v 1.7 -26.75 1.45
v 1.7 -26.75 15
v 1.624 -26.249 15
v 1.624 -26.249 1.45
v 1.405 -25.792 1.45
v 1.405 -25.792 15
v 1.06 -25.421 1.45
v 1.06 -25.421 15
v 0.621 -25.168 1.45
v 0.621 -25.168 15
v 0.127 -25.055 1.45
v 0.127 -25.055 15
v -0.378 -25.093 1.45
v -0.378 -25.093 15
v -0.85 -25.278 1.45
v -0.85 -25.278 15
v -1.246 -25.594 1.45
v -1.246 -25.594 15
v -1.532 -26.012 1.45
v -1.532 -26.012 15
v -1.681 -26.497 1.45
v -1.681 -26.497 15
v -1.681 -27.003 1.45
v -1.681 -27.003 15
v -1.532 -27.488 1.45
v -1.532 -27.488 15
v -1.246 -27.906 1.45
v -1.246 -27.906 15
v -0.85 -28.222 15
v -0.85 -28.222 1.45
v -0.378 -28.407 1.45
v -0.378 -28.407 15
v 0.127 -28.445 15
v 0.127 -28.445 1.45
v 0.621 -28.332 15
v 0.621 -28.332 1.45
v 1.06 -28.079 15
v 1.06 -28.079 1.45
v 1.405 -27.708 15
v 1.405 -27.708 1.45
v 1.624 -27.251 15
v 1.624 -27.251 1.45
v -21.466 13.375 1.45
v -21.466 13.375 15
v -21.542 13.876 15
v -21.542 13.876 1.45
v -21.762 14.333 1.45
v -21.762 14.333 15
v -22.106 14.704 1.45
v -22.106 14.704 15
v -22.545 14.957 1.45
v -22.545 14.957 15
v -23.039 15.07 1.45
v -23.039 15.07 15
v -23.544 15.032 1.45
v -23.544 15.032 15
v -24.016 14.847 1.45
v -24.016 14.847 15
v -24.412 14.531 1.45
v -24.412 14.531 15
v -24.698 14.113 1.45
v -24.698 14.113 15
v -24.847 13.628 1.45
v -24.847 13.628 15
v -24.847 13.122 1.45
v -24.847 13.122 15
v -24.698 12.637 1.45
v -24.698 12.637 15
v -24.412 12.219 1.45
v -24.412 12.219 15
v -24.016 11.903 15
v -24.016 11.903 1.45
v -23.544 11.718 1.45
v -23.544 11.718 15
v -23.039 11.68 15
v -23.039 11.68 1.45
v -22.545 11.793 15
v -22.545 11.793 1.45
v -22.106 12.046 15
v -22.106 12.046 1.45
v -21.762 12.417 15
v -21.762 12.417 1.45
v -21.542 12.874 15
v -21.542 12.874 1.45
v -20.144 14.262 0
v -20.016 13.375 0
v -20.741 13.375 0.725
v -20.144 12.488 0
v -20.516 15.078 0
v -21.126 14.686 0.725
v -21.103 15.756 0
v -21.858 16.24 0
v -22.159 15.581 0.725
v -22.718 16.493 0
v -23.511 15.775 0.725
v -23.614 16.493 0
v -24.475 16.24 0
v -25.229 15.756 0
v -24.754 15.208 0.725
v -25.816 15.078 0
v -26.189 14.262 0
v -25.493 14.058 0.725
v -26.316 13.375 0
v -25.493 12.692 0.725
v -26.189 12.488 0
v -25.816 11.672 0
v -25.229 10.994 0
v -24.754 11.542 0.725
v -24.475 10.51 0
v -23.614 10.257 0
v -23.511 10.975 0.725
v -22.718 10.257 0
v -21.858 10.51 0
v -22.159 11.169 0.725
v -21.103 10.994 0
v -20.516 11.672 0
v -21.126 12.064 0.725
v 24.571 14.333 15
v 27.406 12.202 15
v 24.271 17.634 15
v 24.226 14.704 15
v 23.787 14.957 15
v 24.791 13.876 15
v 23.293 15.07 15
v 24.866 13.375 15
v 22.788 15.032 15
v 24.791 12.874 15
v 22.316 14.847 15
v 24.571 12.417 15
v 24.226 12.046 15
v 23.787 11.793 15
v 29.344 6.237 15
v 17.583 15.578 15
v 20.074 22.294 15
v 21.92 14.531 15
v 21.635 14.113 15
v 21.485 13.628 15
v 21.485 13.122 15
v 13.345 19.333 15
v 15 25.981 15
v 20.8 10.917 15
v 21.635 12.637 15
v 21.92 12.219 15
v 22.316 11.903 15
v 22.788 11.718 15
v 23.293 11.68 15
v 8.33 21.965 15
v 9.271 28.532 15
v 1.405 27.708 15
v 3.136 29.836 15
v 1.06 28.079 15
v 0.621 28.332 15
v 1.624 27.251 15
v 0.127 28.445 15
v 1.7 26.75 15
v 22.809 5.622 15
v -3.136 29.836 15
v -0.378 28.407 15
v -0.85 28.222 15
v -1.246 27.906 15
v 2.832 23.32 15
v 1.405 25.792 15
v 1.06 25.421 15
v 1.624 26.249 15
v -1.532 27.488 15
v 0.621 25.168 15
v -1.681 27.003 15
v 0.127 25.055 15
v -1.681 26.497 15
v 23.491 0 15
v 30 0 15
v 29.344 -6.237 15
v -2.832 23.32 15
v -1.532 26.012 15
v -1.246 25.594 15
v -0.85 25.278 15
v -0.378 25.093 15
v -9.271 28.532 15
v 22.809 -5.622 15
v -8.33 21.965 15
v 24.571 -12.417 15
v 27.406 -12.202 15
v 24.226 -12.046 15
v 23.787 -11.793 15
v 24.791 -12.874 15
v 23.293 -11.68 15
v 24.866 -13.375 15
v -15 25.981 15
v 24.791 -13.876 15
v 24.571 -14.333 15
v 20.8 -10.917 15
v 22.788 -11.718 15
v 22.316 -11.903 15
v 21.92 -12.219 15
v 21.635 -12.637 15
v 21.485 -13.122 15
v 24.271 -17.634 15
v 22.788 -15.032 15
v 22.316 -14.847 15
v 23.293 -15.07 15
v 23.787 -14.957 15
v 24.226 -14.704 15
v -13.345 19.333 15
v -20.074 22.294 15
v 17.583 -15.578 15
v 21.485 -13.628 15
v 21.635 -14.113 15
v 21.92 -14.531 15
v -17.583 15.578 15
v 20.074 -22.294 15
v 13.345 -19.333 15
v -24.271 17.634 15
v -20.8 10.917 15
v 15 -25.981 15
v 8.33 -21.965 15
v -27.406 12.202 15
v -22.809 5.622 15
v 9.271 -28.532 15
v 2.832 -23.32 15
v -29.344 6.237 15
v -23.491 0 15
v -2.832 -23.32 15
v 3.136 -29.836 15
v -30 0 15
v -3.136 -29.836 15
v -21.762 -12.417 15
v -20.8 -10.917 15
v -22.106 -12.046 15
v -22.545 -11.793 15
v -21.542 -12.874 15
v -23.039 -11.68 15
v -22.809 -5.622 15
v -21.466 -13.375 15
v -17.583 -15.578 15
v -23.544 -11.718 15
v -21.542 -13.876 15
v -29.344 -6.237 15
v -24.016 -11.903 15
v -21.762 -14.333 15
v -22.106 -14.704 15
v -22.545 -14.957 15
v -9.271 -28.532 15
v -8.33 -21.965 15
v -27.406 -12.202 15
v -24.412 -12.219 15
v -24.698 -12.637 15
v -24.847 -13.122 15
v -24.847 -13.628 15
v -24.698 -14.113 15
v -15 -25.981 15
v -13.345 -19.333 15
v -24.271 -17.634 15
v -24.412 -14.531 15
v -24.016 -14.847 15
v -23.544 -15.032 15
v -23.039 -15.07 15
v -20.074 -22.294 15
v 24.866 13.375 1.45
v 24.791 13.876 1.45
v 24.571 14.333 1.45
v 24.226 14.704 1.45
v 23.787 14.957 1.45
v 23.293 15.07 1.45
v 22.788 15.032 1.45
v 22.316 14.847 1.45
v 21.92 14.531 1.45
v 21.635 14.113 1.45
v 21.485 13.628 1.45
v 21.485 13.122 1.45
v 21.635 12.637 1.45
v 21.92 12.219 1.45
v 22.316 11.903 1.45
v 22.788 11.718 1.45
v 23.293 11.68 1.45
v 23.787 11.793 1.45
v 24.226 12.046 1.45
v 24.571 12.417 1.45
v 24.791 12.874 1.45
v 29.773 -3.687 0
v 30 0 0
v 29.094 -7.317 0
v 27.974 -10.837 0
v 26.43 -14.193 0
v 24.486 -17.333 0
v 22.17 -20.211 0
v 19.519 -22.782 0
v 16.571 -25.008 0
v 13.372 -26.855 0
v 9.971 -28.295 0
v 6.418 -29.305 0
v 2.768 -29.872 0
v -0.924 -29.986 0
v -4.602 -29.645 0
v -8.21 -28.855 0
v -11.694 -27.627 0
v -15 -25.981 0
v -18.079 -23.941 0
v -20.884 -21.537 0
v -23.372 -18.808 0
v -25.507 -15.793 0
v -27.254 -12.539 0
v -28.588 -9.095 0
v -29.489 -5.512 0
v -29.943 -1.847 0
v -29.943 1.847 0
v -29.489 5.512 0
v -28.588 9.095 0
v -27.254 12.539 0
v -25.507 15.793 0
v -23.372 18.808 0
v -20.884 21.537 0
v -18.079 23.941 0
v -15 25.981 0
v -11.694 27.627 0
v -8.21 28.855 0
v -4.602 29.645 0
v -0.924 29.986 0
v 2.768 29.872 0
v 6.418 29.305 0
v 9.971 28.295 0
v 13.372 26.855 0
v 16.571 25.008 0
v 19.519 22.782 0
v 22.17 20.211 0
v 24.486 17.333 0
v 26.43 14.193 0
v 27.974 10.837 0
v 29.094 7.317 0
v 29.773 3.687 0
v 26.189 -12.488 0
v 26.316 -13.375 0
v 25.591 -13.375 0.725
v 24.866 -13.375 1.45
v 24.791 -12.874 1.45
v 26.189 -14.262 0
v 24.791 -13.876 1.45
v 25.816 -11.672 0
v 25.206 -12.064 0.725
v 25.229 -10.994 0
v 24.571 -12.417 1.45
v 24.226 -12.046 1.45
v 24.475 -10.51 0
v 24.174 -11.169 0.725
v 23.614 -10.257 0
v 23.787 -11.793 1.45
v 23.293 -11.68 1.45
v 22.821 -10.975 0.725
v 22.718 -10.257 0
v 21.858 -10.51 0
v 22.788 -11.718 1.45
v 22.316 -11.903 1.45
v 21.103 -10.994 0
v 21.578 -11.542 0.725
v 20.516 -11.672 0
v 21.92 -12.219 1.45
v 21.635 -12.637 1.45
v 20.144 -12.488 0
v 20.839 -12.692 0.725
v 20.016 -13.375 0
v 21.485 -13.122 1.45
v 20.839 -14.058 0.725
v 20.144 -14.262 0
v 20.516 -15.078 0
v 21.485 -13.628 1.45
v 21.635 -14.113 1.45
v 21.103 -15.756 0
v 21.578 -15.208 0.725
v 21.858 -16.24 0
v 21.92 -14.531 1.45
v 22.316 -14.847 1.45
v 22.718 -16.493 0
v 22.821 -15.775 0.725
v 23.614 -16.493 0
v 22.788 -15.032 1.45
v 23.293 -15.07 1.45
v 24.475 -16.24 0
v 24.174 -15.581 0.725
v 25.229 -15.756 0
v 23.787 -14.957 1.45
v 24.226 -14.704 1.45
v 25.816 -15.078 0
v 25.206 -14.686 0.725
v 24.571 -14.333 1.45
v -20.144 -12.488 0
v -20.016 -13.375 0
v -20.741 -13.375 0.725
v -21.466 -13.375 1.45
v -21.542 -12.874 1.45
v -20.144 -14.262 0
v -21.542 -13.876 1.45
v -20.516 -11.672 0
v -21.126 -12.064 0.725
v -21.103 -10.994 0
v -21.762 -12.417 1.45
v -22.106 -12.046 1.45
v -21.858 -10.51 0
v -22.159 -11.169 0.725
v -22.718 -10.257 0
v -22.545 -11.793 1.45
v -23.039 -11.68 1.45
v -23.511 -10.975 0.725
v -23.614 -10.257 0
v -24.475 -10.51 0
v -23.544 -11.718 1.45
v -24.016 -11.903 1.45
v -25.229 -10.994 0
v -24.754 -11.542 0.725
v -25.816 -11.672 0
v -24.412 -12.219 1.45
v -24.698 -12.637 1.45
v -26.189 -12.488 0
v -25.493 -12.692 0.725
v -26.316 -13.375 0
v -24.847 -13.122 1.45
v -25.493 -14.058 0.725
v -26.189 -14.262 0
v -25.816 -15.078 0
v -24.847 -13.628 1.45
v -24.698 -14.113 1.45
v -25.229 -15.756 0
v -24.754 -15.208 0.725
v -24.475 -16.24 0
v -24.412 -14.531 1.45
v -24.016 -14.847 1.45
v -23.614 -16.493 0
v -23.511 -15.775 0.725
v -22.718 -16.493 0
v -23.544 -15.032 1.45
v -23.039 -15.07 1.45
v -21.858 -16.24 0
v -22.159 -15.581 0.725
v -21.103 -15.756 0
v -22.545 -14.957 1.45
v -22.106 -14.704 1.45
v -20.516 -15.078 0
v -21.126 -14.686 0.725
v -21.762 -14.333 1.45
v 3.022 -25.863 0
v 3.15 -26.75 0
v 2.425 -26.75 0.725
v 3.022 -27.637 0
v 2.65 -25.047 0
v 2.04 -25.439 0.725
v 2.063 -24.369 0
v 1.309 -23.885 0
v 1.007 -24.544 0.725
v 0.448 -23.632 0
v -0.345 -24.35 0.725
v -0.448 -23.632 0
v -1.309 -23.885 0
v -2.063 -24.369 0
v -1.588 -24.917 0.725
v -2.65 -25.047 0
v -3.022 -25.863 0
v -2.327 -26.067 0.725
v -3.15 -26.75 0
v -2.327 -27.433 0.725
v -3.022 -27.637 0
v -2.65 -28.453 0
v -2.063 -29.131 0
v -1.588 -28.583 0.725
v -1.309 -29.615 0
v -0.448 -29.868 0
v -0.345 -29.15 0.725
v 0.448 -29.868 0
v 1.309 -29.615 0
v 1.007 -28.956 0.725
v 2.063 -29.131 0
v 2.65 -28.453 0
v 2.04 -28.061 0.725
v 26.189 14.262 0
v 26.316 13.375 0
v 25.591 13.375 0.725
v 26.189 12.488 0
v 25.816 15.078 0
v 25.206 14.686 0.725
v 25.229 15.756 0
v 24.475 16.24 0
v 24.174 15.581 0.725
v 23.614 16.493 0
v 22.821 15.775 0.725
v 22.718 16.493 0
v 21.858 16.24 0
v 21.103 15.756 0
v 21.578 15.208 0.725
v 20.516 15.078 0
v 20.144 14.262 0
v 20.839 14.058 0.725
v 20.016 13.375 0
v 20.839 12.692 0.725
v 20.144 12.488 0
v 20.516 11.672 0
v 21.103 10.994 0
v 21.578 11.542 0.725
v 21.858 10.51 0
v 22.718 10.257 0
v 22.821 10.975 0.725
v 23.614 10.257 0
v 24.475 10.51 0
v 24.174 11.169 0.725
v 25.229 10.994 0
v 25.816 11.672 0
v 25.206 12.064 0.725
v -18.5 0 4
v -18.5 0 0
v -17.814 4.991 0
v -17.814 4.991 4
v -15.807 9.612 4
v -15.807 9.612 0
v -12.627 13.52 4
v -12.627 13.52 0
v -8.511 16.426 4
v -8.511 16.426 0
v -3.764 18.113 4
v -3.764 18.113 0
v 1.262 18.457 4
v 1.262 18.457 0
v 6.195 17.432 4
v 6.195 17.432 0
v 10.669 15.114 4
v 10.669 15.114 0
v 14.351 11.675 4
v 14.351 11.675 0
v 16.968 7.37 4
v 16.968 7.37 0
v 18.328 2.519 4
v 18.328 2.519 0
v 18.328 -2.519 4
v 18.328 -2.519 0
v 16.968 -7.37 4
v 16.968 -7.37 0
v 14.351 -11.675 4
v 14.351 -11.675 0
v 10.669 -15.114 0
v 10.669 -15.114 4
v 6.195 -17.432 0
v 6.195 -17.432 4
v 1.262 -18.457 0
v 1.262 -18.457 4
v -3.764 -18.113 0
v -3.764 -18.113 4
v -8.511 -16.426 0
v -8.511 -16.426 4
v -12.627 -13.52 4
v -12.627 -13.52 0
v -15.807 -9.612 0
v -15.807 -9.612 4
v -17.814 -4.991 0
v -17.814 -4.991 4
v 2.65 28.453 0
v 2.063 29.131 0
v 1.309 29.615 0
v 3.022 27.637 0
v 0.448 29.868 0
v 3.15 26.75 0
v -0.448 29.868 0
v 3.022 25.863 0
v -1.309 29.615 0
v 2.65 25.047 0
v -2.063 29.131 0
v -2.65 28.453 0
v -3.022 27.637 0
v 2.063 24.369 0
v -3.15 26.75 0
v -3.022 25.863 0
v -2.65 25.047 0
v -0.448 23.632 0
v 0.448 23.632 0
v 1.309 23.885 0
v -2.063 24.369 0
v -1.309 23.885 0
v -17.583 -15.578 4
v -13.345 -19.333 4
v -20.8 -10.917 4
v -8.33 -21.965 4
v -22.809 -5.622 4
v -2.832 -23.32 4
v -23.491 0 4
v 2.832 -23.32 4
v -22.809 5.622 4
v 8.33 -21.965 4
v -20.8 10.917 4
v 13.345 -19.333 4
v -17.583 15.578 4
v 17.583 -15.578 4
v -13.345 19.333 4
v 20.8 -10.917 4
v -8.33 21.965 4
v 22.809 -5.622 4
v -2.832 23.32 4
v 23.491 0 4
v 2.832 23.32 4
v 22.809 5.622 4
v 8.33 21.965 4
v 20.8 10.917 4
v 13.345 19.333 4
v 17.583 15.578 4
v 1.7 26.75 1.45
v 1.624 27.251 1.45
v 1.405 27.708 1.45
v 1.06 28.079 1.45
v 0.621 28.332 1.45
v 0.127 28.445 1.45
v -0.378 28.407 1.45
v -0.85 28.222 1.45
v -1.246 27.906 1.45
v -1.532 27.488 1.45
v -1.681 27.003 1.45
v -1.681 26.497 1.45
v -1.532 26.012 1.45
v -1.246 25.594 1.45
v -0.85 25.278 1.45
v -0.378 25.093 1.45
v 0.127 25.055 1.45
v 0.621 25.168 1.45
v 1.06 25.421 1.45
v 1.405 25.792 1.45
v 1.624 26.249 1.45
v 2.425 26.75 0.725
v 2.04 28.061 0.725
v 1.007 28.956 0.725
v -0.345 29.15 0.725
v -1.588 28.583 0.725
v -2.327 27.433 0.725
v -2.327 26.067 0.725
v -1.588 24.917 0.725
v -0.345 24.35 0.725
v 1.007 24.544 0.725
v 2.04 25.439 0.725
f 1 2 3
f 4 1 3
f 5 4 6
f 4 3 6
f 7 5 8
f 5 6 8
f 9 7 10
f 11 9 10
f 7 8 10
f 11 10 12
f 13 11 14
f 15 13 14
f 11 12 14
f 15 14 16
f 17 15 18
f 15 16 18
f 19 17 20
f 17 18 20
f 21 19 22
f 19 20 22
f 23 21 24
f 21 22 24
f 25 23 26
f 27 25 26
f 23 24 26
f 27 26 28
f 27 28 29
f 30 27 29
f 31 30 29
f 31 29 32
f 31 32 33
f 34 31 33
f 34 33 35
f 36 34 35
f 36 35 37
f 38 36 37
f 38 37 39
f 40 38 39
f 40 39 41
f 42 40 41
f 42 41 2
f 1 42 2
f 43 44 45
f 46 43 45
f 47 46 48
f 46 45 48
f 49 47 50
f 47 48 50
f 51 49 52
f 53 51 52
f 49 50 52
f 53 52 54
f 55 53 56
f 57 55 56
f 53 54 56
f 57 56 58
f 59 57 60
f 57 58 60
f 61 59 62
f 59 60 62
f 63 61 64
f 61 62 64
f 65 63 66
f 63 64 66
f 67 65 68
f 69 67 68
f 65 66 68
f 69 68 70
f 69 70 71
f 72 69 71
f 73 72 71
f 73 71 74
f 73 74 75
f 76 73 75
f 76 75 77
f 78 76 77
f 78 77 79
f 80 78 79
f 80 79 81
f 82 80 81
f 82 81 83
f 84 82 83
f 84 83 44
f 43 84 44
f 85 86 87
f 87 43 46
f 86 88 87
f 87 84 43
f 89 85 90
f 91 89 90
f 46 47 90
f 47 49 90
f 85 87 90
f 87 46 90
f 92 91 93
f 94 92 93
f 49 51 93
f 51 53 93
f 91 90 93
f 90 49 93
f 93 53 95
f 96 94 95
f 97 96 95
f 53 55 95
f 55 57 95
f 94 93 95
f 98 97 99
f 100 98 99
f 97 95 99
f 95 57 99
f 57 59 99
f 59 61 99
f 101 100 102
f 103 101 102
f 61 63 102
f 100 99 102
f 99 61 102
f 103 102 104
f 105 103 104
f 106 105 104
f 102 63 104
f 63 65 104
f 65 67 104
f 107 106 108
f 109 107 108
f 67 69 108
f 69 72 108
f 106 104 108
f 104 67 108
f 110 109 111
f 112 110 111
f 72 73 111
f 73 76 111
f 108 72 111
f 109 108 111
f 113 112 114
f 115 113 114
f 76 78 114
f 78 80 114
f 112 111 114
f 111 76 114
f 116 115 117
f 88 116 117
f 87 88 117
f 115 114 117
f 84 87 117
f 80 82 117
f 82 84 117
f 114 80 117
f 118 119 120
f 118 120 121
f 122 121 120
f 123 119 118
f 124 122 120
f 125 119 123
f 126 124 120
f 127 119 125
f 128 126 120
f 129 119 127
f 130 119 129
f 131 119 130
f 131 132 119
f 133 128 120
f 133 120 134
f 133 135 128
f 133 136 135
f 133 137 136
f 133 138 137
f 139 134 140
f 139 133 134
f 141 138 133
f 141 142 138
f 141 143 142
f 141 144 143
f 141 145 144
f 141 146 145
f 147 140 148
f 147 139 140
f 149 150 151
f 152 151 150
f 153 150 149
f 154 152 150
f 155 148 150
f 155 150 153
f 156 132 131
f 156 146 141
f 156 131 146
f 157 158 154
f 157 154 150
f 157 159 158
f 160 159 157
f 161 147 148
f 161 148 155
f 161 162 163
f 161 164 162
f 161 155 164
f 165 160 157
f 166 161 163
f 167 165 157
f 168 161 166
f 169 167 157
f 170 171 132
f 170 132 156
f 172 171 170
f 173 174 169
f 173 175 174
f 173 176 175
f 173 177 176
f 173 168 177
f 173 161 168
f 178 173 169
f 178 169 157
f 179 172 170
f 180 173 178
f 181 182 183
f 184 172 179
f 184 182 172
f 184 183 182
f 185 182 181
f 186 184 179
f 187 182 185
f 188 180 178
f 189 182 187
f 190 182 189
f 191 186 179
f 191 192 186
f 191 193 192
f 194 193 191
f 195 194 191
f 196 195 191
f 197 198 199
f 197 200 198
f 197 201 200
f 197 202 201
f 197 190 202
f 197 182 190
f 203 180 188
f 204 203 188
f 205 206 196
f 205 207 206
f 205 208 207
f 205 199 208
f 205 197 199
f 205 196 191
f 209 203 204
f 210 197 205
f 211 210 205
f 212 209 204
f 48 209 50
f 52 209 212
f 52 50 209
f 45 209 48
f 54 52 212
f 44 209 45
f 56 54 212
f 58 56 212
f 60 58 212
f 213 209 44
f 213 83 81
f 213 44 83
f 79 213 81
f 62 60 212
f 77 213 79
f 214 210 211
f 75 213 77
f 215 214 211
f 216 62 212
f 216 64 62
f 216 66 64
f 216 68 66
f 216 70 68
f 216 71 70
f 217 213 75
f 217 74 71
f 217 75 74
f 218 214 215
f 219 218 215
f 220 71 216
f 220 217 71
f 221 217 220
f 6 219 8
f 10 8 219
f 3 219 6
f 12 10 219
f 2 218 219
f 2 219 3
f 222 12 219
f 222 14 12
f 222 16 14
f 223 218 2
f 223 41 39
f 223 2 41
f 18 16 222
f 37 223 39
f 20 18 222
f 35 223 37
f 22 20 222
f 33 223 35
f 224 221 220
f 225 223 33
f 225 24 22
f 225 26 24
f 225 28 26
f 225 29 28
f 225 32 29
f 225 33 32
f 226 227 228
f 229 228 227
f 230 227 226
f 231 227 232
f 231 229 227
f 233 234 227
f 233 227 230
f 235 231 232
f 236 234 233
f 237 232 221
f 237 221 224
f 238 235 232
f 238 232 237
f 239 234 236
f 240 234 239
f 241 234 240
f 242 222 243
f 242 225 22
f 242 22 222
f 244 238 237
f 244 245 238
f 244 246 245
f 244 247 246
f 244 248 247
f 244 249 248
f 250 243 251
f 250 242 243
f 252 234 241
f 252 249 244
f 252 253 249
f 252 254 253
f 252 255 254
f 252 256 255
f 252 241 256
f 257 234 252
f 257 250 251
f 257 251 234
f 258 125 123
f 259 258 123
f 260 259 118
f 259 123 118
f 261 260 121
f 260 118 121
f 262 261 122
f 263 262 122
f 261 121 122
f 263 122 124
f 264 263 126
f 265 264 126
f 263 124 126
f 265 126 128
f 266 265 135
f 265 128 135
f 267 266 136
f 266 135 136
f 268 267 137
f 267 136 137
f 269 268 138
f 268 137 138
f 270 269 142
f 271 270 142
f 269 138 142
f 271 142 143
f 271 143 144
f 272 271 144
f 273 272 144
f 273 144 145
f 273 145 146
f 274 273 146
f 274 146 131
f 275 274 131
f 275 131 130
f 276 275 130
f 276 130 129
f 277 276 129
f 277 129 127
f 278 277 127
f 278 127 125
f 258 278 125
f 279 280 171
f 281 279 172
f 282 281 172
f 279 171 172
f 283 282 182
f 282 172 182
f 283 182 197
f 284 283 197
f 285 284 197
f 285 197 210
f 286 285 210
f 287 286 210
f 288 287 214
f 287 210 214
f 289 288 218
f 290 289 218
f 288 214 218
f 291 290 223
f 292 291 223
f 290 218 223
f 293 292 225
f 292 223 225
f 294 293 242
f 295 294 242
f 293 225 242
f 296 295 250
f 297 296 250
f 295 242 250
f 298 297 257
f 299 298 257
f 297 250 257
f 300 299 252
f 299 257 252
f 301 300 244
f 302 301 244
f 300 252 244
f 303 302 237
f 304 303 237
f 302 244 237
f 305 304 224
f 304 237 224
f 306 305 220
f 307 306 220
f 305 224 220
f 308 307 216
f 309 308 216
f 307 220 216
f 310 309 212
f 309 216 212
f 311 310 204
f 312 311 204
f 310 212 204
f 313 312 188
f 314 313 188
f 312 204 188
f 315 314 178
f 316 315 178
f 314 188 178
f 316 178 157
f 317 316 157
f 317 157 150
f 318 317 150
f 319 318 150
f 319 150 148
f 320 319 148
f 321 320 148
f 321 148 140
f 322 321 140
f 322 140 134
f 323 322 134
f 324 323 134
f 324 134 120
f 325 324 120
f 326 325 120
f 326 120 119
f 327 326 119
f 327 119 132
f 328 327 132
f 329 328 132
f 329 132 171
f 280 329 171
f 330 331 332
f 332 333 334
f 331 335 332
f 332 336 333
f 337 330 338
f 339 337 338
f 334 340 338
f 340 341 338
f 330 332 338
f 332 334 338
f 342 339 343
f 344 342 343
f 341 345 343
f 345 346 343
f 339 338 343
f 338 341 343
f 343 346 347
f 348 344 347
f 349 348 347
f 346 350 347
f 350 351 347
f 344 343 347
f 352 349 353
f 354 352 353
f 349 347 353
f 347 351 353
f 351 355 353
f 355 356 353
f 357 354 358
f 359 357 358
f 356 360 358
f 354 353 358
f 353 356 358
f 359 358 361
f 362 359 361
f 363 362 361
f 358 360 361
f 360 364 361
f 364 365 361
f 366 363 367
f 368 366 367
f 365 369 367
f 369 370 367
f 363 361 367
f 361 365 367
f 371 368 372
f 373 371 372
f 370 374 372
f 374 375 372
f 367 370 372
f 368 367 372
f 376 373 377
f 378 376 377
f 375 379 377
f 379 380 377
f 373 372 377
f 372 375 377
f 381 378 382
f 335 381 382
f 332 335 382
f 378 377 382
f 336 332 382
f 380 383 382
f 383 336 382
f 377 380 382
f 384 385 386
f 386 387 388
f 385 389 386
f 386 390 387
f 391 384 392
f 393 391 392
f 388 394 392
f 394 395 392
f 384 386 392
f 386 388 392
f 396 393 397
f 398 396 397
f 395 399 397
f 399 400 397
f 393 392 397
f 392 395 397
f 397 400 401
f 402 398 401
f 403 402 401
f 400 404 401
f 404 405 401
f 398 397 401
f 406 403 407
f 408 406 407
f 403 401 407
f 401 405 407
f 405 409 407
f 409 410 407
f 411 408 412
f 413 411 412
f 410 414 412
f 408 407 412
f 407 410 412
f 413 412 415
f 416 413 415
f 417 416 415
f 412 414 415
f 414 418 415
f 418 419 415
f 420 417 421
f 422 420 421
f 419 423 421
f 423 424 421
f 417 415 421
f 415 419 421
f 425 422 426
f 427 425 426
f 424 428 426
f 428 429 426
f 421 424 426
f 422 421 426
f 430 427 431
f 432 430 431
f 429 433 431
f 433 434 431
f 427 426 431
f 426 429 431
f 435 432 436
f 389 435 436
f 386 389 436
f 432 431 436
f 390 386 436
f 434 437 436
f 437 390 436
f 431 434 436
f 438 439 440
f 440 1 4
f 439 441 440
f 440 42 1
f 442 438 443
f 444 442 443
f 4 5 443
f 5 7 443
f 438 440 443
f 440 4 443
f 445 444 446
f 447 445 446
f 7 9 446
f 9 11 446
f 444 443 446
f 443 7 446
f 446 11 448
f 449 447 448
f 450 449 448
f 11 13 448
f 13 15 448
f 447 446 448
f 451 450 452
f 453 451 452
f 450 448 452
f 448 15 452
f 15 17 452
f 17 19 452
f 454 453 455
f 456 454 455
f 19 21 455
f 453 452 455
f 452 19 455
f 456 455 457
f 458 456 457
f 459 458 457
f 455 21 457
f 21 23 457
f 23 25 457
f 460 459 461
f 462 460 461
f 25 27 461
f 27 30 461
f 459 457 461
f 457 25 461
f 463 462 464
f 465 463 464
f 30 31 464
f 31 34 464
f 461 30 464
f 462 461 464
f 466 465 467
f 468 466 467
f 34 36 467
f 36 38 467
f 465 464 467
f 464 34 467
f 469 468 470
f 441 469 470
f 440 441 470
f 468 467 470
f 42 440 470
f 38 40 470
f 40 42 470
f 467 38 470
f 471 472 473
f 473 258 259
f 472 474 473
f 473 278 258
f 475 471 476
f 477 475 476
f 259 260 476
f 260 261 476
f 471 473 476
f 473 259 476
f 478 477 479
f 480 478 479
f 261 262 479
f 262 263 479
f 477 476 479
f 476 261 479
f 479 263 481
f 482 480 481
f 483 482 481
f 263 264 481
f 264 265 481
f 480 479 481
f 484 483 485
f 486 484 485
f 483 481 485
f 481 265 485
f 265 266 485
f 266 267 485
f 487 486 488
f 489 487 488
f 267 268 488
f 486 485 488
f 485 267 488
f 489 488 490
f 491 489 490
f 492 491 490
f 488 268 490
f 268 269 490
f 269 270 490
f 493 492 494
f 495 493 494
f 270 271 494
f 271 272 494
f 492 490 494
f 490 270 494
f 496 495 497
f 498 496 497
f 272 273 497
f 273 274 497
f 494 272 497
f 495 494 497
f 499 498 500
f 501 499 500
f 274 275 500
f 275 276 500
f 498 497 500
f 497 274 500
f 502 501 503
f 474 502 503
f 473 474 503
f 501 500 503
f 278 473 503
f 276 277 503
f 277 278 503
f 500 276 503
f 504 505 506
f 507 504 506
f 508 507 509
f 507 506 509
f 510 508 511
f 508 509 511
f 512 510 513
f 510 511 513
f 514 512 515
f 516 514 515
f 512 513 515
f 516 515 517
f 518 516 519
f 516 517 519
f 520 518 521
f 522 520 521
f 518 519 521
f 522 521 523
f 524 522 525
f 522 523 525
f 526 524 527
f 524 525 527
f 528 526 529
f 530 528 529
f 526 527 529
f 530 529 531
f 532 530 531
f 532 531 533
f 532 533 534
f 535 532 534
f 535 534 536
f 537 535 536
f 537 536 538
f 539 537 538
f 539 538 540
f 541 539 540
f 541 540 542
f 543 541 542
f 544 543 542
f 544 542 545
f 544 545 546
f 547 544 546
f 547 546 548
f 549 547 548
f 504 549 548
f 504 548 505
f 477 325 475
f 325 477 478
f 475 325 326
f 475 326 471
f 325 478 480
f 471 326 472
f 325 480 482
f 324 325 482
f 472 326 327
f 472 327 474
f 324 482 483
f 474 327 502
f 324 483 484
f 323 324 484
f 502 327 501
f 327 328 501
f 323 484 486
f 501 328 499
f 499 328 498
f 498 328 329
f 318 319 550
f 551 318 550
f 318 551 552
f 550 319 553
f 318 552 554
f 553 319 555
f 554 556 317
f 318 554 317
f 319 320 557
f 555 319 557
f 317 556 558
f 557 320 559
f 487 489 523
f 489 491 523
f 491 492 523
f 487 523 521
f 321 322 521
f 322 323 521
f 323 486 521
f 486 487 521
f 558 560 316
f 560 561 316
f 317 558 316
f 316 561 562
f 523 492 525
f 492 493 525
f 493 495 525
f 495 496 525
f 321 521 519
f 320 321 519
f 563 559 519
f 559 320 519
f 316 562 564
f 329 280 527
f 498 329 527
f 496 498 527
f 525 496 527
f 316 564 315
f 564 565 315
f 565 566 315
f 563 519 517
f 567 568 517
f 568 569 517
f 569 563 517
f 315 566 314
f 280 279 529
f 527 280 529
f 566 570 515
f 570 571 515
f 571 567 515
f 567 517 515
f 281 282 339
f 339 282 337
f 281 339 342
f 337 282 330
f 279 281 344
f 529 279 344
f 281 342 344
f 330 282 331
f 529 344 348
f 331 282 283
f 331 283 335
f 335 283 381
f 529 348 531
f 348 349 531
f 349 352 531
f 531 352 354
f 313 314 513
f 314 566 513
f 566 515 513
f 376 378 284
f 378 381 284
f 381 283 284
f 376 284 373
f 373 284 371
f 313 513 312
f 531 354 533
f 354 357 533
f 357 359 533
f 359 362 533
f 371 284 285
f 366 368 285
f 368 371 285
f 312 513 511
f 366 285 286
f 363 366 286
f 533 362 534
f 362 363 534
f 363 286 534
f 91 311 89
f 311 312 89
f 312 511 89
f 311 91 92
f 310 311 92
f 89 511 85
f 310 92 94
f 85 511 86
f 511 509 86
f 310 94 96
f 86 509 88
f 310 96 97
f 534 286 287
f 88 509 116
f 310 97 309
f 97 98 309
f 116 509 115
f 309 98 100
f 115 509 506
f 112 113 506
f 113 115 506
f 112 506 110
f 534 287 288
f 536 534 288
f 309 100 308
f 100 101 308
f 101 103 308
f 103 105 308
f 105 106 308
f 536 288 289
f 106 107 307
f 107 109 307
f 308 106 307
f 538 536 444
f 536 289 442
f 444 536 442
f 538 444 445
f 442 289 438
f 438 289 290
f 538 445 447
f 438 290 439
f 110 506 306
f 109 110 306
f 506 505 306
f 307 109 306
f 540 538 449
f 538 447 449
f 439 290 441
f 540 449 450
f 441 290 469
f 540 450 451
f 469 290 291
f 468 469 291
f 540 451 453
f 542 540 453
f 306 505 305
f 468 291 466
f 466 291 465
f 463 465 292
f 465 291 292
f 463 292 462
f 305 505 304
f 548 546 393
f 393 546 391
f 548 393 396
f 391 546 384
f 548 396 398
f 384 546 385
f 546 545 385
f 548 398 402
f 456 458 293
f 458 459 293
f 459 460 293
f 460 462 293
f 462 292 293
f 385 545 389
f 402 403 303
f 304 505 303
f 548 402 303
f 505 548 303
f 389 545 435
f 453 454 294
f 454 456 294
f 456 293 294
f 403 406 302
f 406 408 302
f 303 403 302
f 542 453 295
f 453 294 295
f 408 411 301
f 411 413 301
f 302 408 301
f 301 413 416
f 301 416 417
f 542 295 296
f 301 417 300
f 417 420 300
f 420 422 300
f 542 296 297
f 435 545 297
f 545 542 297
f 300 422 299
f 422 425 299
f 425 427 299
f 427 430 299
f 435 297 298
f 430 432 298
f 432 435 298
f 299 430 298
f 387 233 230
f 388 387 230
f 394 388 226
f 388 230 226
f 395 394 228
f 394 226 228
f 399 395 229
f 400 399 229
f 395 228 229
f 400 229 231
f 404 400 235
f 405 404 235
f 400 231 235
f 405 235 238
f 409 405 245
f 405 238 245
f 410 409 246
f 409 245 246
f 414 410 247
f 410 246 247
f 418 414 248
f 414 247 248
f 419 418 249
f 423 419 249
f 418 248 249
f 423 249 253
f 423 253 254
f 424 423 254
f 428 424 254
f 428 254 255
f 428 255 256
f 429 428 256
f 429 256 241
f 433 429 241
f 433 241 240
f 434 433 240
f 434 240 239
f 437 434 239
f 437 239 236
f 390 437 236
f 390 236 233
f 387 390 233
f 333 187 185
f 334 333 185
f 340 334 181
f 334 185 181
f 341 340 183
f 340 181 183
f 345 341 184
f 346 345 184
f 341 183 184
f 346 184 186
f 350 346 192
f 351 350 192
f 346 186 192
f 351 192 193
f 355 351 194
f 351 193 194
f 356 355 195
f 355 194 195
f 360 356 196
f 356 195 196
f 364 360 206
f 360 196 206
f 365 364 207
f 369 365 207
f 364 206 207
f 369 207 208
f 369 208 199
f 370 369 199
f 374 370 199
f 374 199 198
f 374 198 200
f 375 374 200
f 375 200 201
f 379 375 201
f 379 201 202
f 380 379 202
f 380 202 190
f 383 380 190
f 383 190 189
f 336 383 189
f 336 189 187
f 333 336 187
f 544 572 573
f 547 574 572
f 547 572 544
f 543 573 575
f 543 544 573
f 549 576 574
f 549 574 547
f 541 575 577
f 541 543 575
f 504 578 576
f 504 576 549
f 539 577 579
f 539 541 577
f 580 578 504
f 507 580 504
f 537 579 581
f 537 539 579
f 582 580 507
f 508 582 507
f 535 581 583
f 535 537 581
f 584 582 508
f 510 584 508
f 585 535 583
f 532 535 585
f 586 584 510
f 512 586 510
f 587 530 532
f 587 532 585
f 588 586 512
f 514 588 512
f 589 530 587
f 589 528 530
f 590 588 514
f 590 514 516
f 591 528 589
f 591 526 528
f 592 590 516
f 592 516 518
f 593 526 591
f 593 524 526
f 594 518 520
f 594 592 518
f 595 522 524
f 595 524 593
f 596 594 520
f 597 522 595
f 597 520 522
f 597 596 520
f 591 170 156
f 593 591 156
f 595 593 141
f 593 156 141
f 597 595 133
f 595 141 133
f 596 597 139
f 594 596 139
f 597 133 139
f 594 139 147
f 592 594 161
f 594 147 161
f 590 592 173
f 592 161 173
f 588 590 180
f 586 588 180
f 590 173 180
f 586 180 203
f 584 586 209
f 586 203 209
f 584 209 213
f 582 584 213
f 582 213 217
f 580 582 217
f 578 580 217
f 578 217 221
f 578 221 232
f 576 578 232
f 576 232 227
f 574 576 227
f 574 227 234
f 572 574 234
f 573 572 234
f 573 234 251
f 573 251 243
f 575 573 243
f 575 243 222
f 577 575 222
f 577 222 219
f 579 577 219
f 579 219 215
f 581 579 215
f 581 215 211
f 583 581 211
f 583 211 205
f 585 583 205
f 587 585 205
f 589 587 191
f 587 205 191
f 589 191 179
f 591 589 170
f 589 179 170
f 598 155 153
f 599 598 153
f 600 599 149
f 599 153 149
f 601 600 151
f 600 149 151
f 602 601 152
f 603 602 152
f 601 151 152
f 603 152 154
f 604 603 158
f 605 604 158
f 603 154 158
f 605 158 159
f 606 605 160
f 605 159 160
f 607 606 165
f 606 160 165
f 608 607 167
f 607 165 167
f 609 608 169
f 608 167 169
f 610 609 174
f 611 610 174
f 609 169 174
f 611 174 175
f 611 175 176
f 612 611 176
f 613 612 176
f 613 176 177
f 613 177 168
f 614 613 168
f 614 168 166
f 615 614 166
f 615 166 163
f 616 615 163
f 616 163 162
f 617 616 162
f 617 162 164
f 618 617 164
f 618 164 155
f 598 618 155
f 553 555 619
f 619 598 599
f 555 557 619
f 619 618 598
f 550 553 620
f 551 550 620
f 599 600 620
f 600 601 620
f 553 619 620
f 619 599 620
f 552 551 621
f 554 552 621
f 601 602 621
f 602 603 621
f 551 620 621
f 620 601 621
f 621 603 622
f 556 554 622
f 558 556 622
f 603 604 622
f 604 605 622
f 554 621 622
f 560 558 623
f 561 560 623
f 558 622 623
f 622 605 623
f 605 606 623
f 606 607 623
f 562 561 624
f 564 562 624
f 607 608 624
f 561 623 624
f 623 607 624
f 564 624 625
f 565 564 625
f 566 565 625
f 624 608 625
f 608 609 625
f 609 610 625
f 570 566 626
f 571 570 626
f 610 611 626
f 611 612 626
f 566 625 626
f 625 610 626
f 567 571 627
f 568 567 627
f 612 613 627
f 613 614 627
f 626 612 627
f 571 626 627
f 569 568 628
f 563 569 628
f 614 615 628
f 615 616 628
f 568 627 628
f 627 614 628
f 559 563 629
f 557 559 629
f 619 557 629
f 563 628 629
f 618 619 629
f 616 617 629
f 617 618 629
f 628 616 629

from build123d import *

# Parameters (mm, degrees)
SKETCH1_W                 = 30
SKETCH1_H                 = 15
F_4_CLEARANCE_HOLE1_D     = 3.4
F_4_CLEARANCE_HOLE1_DEPTH = 15
HOLE1_D                   = 37
HOLE1_DEPTH               = 15
HOLE1_CBORE_D             = 46.98238
HOLE1_CBORE_DEPTH         = 11
CHAMFER1_SIZE             = 1.45


with BuildPart() as part:
    # Sketch1 → Revolve1 (revolve)
    with BuildSketch(Plane.XZ):
        with Locations((15, 7.5)):
            Rectangle(SKETCH1_W, SKETCH1_H)
    revolve(axis=Axis((0, 0, 15), (0, 0, -1)))

    # #4 Clearance Hole1
    with Locations(Plane(origin=(0, 0, 0), x_dir=(-1, 0, 0), z_dir=(0, 0, -1))):
        with Locations((-23.166179551, -13.375), (-23.166179551, 13.375), (0, 26.75), (23.166179551, -13.375), (0, -26.75), (23.166179551, 13.375)):
            Hole(F_4_CLEARANCE_HOLE1_D / 2, depth=F_4_CLEARANCE_HOLE1_DEPTH)

    # Hole1
    with Locations(Plane.XY.offset(15)):
        with Locations((0, 0)):
            CounterBoreHole(HOLE1_D / 2, HOLE1_CBORE_D / 2, HOLE1_CBORE_DEPTH, depth=HOLE1_DEPTH)

    # Chamfer1
    chamfer1_edges = [part.edges().sort_by_distance(p)[0] for p in [
        (-24.866179551, 13.375, 0),
        (-1.7, -26.75, 0),
        (-24.866179551, -13.375, 0),
        (-1.7, 26.75, 0),
        (21.466179551, 13.375, 0),
        (21.466179551, -13.375, 0),
    ]]
    chamfer(chamfer1_edges, length=CHAMFER1_SIZE)


solid = part.part
